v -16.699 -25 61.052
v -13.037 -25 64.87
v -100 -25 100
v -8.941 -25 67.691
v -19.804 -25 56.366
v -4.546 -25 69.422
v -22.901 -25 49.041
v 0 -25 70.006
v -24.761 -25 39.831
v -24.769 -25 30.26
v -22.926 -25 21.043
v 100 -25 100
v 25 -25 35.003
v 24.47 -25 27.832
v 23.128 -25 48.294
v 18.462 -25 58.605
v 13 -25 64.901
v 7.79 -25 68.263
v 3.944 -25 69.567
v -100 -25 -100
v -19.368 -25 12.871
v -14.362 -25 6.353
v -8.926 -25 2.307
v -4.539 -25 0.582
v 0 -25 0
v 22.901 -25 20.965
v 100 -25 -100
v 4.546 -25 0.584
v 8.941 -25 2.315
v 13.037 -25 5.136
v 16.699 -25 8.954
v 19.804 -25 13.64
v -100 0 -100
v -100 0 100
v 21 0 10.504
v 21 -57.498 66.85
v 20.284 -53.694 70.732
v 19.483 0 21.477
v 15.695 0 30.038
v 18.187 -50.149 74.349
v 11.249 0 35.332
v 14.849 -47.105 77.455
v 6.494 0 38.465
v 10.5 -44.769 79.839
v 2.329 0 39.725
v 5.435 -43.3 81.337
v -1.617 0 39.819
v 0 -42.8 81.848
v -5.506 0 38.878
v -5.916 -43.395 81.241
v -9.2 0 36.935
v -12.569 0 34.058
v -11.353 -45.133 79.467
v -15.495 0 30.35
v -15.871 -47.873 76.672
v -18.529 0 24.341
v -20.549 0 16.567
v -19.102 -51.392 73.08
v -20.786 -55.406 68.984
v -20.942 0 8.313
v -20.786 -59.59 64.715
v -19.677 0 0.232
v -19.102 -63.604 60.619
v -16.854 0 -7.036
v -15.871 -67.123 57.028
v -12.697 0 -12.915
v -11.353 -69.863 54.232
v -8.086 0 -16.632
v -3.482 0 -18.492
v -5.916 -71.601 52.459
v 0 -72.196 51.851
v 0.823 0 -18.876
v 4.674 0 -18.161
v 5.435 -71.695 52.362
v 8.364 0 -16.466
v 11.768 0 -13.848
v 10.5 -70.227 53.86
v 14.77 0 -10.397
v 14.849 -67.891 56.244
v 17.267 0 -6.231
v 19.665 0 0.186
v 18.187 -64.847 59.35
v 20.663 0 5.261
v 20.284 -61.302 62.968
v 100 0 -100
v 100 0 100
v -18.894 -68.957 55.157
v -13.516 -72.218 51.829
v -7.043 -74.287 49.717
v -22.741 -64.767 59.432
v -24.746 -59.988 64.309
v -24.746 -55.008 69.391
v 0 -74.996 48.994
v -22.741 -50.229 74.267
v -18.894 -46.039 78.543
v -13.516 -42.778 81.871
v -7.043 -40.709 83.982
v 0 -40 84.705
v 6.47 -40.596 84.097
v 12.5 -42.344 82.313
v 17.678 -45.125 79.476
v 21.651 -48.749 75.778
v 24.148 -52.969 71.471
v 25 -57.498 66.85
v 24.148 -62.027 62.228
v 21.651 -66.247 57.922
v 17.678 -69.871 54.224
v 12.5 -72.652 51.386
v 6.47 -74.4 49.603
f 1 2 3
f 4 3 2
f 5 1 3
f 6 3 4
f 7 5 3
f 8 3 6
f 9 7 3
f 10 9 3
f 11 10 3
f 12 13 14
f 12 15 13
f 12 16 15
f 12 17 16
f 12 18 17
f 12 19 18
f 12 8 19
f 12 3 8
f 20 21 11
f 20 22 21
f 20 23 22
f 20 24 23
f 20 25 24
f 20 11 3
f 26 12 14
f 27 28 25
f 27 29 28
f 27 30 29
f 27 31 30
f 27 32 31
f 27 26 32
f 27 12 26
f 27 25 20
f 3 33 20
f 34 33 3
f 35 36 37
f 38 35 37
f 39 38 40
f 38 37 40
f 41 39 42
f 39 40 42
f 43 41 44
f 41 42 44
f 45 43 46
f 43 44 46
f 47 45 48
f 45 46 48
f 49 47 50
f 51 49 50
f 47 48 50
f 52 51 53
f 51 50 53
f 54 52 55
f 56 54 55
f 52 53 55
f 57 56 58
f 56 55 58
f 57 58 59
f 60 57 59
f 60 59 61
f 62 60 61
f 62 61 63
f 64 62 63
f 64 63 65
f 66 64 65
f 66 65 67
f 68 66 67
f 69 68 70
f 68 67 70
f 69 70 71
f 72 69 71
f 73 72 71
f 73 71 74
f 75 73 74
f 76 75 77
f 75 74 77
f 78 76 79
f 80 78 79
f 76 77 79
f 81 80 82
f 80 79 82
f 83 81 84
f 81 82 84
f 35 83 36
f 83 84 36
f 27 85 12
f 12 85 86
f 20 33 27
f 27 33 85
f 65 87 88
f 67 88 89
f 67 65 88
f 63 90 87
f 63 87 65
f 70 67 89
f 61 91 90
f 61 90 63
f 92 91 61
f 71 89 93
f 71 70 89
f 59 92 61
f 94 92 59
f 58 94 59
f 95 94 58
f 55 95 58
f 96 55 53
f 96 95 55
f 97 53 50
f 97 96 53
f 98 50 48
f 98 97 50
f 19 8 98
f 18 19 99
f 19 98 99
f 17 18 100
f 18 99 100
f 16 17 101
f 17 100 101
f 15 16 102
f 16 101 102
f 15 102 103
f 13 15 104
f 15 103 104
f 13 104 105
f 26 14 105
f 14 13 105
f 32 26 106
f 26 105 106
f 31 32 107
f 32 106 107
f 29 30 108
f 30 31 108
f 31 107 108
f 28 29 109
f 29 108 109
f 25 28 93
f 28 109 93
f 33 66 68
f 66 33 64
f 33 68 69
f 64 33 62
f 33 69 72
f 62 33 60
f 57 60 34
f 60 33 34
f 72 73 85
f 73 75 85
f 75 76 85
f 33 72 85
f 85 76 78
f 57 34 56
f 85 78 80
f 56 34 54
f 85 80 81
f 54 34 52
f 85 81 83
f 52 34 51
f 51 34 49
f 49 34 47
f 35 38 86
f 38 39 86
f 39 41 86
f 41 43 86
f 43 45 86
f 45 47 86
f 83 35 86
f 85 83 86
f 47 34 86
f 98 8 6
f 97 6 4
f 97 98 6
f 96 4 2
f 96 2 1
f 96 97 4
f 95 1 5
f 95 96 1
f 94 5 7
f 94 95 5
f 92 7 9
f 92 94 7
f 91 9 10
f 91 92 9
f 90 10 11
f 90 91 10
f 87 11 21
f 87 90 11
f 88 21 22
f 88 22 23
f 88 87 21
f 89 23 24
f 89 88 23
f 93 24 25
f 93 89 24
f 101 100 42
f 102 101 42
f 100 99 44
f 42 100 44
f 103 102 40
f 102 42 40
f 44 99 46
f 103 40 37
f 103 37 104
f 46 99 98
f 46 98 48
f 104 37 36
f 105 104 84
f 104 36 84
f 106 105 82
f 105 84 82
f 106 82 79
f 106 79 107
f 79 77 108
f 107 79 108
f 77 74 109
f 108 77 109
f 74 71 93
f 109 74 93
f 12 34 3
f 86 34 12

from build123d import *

# Parameters (mm, degrees)
F0_W     = 200
F0_H     = 200
F1_DEPTH = 25
F3_DEPTH = 25
F4_R     = 25
F5_REACH = 228.5588830885
F7_REACH = 193.2035440291
F8_R     = 21
F9_DEPTH = 101.0840931723


with BuildPart() as f1:
    # F0 (on Front) → F1 (new body)
    with BuildSketch(Plane.XZ):
        Rectangle(F0_W, F0_H)
    extrude(amount=F1_DEPTH)

    # F2 (on Right) → F3 (join)
    with BuildSketch(Plane.YZ):
        Polygon((-74.9957839266, 48.9940974972), (-25, 0), (-25, 70.0059030005), (-40, 84.7053717305), align=None)
    extrude(amount=F3_DEPTH)

    f5_end = Plane(origin=(-0.5719458586, -25, -1.601583452), x_dir=(0, 0, -1), z_dir=(0, -1, 0))
    # F4 (on face) → F5 (join, up to a plane its end follows)
    with BuildSketch(Plane(origin=(0, -62.7487350002, 61.4915378653), x_dir=(1, 0, 0), z_dir=(0, -0.7142254847, 0.6999156785))):
        with Locations((0, 7.5021080367)):
            Circle(F4_R)
    f5_long = extrude(amount=-F5_REACH, mode=Mode.PRIVATE)
    add(split(f5_long, bisect_by=f5_end, keep=Keep.TOP, mode=Mode.PRIVATE))

    f7_end = Plane(origin=(-0.1977552343, -25, -2.9660534924), x_dir=(0, 0, -1), z_dir=(0, -1, 0))
    # F6 (on face) → F7 (cut, up to a plane its end follows)
    with BuildSketch(Plane(origin=(0, -62.7487350002, 61.4915378653), x_dir=(1, 0, 0), z_dir=(0, -0.7142254847, 0.6999156785))):
        with BuildLine():
            ThreePointArc((0, 32.5021080367), (17.6776695297, 25.1797775664), (25, 7.5021080367))
            Line((25, 7.5021080367), (25, 32.5021080367))
            Line((25, 32.5021080367), (0, 32.5021080367))
        make_face()
        with BuildLine():
            ThreePointArc((25, 7.5021080367), (17.6776695297, -10.175561493), (0, -17.4978919633))
            Line((0, -17.4978919633), (25, -17.4978919633))
            Line((25, -17.4978919633), (25, 7.5021080367))
        make_face()
    f7_long = extrude(amount=-F7_REACH, mode=Mode.PRIVATE)
    add(split(f7_long, bisect_by=f7_end, keep=Keep.TOP, mode=Mode.PRIVATE), mode=Mode.SUBTRACT)

    # F8 (on face) → F9 (cut, through all)
    with BuildSketch(Plane(origin=(0, -62.7487350002, 61.4915378653), x_dir=(1, 0, 0), z_dir=(0, -0.7142254847, 0.6999156785))):
        with Locations((0, 7.5021080367)):
            Circle(F8_R)
    extrude(amount=-F9_DEPTH, mode=Mode.SUBTRACT)


solid = f1.part
